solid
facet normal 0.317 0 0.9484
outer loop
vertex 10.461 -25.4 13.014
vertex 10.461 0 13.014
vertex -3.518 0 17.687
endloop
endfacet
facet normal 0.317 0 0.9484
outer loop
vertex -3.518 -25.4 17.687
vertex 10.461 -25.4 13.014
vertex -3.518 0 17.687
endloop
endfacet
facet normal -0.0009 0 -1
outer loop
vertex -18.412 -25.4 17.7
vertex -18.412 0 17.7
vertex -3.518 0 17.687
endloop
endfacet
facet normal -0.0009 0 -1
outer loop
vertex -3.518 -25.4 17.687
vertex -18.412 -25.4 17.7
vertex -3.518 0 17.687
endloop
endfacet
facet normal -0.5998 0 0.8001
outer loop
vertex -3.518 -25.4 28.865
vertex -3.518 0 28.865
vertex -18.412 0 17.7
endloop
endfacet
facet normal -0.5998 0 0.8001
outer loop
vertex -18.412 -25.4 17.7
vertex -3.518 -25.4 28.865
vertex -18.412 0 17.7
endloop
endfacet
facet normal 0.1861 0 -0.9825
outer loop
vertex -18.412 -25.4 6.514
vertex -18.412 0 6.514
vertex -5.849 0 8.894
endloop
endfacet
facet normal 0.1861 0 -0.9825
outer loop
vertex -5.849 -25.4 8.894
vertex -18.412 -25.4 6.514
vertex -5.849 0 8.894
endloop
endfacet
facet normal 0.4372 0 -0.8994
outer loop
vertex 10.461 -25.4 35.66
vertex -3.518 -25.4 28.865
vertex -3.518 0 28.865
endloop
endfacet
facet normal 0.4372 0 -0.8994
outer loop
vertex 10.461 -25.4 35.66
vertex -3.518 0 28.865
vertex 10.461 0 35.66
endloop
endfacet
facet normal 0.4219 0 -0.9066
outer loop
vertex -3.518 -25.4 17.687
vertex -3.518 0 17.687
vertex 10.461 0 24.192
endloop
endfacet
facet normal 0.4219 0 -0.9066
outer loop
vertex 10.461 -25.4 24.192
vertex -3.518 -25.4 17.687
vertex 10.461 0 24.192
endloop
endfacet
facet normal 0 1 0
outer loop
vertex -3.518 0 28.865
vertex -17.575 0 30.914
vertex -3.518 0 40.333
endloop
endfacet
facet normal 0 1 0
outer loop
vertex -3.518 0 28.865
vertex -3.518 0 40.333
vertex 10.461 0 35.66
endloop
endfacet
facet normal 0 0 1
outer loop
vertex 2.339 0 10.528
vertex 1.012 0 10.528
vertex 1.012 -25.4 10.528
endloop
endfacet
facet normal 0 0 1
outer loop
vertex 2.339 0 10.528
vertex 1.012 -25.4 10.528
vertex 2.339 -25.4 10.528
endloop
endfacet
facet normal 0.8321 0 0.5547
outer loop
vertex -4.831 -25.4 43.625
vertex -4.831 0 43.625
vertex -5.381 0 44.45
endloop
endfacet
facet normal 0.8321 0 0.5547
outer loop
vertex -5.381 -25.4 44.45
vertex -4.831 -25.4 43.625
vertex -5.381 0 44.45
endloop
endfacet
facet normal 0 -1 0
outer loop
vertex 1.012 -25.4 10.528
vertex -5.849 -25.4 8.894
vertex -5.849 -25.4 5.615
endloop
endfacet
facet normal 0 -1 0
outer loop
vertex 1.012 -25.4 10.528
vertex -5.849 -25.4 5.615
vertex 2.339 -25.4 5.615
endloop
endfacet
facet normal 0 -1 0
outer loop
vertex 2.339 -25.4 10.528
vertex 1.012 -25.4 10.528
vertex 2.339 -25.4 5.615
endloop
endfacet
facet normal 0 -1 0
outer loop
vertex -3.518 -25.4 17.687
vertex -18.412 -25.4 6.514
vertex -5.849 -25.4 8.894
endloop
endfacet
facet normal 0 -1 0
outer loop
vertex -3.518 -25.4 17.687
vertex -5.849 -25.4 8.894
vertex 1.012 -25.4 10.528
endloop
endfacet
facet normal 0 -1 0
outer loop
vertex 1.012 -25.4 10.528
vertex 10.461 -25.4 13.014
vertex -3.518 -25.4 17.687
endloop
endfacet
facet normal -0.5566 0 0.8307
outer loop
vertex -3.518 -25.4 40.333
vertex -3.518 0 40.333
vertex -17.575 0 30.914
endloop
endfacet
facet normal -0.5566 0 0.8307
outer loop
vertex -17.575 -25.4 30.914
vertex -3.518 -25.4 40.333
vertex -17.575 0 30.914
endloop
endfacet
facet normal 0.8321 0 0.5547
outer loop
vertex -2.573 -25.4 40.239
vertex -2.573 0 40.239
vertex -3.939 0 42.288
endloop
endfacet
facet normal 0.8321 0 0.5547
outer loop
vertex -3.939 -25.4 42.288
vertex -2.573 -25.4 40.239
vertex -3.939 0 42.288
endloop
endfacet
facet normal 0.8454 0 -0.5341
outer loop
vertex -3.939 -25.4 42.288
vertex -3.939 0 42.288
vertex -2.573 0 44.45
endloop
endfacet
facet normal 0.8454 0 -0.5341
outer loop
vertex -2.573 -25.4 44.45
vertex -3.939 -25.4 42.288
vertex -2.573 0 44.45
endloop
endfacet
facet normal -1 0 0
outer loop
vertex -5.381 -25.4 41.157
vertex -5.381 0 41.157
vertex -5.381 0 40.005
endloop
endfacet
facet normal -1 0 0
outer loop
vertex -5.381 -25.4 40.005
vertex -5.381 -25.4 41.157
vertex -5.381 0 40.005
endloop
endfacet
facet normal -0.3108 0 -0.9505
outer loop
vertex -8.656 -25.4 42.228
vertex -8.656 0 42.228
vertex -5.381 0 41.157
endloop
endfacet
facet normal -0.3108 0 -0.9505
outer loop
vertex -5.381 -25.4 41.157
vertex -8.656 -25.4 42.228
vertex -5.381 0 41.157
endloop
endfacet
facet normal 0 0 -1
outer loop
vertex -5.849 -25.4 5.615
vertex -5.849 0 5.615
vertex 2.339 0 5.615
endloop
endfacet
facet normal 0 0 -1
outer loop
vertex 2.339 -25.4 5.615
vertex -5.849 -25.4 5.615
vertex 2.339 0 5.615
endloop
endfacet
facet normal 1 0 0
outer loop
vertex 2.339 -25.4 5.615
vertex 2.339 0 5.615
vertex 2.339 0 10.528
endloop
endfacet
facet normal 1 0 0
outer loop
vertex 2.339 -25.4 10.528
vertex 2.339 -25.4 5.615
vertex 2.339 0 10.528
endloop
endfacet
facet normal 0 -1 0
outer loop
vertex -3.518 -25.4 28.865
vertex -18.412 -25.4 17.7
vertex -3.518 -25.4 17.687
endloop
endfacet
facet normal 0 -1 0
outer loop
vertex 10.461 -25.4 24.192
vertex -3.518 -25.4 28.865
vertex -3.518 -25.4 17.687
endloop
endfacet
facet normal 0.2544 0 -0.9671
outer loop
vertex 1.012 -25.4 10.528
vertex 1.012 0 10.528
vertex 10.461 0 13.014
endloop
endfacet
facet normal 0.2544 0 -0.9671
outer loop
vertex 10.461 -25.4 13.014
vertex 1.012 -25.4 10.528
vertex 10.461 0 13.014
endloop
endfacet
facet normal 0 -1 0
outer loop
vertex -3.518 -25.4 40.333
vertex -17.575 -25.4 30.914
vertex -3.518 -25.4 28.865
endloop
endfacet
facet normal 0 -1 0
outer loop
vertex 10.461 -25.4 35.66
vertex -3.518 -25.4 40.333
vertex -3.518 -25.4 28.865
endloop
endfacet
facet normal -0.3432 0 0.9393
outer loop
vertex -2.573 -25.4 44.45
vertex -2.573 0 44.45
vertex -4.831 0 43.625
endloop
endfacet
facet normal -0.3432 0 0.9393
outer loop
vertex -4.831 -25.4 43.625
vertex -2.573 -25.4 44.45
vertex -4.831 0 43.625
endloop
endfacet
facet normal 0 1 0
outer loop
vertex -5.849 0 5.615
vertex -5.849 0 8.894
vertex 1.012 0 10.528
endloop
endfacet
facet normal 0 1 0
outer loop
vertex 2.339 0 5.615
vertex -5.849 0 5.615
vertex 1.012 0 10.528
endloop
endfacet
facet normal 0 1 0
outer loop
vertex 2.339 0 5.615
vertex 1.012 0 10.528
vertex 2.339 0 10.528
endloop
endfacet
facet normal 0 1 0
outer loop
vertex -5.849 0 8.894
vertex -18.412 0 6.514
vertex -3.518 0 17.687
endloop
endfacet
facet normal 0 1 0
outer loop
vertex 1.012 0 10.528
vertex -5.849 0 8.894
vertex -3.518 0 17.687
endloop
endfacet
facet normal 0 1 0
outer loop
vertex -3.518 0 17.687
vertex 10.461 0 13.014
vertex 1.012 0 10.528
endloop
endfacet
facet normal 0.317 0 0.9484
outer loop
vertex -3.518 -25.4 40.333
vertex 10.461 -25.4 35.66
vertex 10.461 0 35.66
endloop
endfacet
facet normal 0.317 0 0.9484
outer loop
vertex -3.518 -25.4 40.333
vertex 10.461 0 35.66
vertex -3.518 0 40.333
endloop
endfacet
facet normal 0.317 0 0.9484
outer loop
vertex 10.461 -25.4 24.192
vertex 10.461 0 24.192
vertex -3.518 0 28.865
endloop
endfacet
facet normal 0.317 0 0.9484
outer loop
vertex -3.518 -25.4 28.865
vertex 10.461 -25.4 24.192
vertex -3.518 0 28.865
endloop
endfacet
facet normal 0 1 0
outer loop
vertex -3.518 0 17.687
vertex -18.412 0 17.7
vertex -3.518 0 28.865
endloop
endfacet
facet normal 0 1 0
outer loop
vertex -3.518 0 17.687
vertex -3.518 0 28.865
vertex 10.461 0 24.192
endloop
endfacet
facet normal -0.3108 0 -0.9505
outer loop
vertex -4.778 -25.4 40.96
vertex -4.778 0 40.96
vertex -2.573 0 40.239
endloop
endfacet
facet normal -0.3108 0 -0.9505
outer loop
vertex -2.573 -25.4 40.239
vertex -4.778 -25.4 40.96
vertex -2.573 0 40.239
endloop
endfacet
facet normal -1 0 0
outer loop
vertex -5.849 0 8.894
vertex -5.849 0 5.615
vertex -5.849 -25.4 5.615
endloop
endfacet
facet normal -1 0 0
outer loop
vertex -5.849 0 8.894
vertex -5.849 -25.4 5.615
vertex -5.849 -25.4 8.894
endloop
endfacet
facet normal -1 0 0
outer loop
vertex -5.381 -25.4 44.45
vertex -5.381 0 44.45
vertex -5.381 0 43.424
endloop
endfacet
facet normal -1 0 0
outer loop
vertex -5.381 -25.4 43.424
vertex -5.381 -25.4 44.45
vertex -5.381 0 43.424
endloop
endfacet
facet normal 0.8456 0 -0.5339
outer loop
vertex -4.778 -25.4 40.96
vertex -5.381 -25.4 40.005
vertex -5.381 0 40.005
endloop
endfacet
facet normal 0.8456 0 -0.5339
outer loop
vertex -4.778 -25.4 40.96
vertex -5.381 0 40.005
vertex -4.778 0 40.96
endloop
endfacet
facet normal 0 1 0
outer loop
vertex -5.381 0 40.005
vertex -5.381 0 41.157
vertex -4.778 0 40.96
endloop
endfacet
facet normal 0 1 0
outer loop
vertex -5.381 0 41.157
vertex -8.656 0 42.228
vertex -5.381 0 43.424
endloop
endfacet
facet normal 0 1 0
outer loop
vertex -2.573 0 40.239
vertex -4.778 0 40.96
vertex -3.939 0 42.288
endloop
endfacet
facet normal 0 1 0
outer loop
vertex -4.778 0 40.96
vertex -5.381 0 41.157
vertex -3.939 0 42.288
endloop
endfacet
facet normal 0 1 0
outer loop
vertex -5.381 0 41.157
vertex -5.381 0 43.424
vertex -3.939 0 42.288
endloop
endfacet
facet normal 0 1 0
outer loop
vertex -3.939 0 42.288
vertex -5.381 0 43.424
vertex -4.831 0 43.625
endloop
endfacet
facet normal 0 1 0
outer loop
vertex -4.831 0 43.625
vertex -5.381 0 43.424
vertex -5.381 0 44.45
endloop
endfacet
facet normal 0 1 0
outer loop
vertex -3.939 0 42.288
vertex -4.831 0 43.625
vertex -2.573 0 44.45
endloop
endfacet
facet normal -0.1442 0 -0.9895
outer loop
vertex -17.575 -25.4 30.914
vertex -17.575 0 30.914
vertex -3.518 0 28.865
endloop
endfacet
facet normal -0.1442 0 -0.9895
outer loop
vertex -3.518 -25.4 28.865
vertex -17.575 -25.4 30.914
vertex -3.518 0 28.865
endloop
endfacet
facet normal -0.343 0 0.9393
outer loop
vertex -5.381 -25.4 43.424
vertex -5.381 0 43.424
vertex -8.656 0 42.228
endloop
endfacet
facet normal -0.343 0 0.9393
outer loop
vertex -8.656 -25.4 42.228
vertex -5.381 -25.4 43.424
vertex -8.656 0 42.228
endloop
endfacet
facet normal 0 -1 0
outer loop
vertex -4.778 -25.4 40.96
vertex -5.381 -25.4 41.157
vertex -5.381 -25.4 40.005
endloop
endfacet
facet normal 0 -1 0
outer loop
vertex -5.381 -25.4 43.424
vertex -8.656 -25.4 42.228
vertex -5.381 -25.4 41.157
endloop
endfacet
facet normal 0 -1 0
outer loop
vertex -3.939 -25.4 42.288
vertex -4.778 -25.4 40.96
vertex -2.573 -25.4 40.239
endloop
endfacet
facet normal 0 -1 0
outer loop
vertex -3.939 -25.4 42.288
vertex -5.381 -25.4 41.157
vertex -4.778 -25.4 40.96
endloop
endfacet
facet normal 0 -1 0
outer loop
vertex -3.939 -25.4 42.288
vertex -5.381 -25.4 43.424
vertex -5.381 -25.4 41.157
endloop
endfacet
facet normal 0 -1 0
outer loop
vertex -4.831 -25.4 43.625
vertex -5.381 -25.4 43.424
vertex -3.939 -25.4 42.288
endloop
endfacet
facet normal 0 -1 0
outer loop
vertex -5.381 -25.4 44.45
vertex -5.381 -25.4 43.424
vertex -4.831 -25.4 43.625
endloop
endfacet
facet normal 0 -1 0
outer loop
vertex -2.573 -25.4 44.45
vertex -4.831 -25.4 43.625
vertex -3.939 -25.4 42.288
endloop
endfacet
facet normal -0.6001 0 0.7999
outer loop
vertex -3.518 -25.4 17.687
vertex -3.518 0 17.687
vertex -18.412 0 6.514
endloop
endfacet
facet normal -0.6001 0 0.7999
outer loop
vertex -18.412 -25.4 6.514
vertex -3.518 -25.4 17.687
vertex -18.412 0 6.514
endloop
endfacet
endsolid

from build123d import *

# Parameters (mm, degrees)
F1_DEPTH = 25.4
F2_W     = 8.1881582737
F2_H     = 4.9128951505
F3_DEPTH = 25.4
F5_DEPTH = 25.4


with BuildPart() as f1:
    # F0 (on Front) → F1 (new body)
    with BuildSketch(Plane.XZ):
        Polygon((10.4613956064, 35.6595031917), (-3.5175860394, 40.3325371444), (-3.5175860394, 28.8647823036), align=None)
        Polygon((-3.5175860394, 28.8647823036), (-3.5175860394, 40.3325371444), (-17.5751429051, 30.913695693), align=None)
    extrude(amount=F1_DEPTH)


with BuildPart() as f1b:
    # F0 (on Front) → F1, piece 2 (new body)
    with BuildSketch(Plane.XZ):
        Polygon((10.4613956064, 13.0142364651), (-3.5175860394, 17.6872704178), (-3.5175860394, 9.335600771), align=None)
        Polygon((-3.5175860394, 9.335600771), (-3.5175860394, 17.6872704178), (-18.4120554477, 6.5137832426), align=None)
    extrude(amount=F1_DEPTH)

    # F2 (on Front) → F3 (join)
    with BuildSketch(Plane.XZ):
        with Locations((-1.754605677, 8.071184624)):
            Rectangle(F2_W, F2_H)
    extrude(amount=F3_DEPTH)


with BuildPart() as f1c:
    # F0 (on Front) → F1, piece 3 (new body)
    with BuildSketch(Plane.XZ):
        Polygon((10.4613956064, 24.1917483509), (-3.5175860394, 28.8647823036), (-3.5175860394, 17.6872704178), align=None)
        Polygon((-3.5175860394, 17.6872704178), (-3.5175860394, 28.8647823036), (-18.4120554477, 17.6999662071), align=None)
    extrude(amount=F1_DEPTH)


with BuildPart() as f5:
    # F4 (on Front) → F5 (new body)
    with BuildSketch(Plane.XZ):
        Polygon((-5.380790215, 41.1567419558), (-5.380790215, 40.0050021708), (-4.7778663743, 40.9596318685), align=None)
        Polygon((-8.6560528725, 42.2275029123), (-5.380790215, 41.1567419558), (-5.380790215, 43.4242339761), align=None)
        Polygon((-5.380790215, 43.4242339761), (-5.380790215, 41.1567419558), (-4.7778663743, 40.9596318685), (-3.9391690301, 42.2875697244), (-4.8308935512, 43.6251578372), align=None)
        Polygon((-3.9391690301, 42.2875697244), (-4.7778663743, 40.9596318685), (-2.5734216906, 40.2389466763), align=None)
        Polygon((-5.380790215, 44.4500036538), (-5.380790215, 43.4242339761), (-4.8308935512, 43.6251578372), align=None)
        Polygon((-4.8308935512, 43.6251578372), (-3.9391690301, 42.2875697244), (-2.5734216906, 44.4500036538), align=None)
    extrude(amount=F5_DEPTH)


solid = Compound([f1.part, f1b.part, f1c.part, f5.part])
